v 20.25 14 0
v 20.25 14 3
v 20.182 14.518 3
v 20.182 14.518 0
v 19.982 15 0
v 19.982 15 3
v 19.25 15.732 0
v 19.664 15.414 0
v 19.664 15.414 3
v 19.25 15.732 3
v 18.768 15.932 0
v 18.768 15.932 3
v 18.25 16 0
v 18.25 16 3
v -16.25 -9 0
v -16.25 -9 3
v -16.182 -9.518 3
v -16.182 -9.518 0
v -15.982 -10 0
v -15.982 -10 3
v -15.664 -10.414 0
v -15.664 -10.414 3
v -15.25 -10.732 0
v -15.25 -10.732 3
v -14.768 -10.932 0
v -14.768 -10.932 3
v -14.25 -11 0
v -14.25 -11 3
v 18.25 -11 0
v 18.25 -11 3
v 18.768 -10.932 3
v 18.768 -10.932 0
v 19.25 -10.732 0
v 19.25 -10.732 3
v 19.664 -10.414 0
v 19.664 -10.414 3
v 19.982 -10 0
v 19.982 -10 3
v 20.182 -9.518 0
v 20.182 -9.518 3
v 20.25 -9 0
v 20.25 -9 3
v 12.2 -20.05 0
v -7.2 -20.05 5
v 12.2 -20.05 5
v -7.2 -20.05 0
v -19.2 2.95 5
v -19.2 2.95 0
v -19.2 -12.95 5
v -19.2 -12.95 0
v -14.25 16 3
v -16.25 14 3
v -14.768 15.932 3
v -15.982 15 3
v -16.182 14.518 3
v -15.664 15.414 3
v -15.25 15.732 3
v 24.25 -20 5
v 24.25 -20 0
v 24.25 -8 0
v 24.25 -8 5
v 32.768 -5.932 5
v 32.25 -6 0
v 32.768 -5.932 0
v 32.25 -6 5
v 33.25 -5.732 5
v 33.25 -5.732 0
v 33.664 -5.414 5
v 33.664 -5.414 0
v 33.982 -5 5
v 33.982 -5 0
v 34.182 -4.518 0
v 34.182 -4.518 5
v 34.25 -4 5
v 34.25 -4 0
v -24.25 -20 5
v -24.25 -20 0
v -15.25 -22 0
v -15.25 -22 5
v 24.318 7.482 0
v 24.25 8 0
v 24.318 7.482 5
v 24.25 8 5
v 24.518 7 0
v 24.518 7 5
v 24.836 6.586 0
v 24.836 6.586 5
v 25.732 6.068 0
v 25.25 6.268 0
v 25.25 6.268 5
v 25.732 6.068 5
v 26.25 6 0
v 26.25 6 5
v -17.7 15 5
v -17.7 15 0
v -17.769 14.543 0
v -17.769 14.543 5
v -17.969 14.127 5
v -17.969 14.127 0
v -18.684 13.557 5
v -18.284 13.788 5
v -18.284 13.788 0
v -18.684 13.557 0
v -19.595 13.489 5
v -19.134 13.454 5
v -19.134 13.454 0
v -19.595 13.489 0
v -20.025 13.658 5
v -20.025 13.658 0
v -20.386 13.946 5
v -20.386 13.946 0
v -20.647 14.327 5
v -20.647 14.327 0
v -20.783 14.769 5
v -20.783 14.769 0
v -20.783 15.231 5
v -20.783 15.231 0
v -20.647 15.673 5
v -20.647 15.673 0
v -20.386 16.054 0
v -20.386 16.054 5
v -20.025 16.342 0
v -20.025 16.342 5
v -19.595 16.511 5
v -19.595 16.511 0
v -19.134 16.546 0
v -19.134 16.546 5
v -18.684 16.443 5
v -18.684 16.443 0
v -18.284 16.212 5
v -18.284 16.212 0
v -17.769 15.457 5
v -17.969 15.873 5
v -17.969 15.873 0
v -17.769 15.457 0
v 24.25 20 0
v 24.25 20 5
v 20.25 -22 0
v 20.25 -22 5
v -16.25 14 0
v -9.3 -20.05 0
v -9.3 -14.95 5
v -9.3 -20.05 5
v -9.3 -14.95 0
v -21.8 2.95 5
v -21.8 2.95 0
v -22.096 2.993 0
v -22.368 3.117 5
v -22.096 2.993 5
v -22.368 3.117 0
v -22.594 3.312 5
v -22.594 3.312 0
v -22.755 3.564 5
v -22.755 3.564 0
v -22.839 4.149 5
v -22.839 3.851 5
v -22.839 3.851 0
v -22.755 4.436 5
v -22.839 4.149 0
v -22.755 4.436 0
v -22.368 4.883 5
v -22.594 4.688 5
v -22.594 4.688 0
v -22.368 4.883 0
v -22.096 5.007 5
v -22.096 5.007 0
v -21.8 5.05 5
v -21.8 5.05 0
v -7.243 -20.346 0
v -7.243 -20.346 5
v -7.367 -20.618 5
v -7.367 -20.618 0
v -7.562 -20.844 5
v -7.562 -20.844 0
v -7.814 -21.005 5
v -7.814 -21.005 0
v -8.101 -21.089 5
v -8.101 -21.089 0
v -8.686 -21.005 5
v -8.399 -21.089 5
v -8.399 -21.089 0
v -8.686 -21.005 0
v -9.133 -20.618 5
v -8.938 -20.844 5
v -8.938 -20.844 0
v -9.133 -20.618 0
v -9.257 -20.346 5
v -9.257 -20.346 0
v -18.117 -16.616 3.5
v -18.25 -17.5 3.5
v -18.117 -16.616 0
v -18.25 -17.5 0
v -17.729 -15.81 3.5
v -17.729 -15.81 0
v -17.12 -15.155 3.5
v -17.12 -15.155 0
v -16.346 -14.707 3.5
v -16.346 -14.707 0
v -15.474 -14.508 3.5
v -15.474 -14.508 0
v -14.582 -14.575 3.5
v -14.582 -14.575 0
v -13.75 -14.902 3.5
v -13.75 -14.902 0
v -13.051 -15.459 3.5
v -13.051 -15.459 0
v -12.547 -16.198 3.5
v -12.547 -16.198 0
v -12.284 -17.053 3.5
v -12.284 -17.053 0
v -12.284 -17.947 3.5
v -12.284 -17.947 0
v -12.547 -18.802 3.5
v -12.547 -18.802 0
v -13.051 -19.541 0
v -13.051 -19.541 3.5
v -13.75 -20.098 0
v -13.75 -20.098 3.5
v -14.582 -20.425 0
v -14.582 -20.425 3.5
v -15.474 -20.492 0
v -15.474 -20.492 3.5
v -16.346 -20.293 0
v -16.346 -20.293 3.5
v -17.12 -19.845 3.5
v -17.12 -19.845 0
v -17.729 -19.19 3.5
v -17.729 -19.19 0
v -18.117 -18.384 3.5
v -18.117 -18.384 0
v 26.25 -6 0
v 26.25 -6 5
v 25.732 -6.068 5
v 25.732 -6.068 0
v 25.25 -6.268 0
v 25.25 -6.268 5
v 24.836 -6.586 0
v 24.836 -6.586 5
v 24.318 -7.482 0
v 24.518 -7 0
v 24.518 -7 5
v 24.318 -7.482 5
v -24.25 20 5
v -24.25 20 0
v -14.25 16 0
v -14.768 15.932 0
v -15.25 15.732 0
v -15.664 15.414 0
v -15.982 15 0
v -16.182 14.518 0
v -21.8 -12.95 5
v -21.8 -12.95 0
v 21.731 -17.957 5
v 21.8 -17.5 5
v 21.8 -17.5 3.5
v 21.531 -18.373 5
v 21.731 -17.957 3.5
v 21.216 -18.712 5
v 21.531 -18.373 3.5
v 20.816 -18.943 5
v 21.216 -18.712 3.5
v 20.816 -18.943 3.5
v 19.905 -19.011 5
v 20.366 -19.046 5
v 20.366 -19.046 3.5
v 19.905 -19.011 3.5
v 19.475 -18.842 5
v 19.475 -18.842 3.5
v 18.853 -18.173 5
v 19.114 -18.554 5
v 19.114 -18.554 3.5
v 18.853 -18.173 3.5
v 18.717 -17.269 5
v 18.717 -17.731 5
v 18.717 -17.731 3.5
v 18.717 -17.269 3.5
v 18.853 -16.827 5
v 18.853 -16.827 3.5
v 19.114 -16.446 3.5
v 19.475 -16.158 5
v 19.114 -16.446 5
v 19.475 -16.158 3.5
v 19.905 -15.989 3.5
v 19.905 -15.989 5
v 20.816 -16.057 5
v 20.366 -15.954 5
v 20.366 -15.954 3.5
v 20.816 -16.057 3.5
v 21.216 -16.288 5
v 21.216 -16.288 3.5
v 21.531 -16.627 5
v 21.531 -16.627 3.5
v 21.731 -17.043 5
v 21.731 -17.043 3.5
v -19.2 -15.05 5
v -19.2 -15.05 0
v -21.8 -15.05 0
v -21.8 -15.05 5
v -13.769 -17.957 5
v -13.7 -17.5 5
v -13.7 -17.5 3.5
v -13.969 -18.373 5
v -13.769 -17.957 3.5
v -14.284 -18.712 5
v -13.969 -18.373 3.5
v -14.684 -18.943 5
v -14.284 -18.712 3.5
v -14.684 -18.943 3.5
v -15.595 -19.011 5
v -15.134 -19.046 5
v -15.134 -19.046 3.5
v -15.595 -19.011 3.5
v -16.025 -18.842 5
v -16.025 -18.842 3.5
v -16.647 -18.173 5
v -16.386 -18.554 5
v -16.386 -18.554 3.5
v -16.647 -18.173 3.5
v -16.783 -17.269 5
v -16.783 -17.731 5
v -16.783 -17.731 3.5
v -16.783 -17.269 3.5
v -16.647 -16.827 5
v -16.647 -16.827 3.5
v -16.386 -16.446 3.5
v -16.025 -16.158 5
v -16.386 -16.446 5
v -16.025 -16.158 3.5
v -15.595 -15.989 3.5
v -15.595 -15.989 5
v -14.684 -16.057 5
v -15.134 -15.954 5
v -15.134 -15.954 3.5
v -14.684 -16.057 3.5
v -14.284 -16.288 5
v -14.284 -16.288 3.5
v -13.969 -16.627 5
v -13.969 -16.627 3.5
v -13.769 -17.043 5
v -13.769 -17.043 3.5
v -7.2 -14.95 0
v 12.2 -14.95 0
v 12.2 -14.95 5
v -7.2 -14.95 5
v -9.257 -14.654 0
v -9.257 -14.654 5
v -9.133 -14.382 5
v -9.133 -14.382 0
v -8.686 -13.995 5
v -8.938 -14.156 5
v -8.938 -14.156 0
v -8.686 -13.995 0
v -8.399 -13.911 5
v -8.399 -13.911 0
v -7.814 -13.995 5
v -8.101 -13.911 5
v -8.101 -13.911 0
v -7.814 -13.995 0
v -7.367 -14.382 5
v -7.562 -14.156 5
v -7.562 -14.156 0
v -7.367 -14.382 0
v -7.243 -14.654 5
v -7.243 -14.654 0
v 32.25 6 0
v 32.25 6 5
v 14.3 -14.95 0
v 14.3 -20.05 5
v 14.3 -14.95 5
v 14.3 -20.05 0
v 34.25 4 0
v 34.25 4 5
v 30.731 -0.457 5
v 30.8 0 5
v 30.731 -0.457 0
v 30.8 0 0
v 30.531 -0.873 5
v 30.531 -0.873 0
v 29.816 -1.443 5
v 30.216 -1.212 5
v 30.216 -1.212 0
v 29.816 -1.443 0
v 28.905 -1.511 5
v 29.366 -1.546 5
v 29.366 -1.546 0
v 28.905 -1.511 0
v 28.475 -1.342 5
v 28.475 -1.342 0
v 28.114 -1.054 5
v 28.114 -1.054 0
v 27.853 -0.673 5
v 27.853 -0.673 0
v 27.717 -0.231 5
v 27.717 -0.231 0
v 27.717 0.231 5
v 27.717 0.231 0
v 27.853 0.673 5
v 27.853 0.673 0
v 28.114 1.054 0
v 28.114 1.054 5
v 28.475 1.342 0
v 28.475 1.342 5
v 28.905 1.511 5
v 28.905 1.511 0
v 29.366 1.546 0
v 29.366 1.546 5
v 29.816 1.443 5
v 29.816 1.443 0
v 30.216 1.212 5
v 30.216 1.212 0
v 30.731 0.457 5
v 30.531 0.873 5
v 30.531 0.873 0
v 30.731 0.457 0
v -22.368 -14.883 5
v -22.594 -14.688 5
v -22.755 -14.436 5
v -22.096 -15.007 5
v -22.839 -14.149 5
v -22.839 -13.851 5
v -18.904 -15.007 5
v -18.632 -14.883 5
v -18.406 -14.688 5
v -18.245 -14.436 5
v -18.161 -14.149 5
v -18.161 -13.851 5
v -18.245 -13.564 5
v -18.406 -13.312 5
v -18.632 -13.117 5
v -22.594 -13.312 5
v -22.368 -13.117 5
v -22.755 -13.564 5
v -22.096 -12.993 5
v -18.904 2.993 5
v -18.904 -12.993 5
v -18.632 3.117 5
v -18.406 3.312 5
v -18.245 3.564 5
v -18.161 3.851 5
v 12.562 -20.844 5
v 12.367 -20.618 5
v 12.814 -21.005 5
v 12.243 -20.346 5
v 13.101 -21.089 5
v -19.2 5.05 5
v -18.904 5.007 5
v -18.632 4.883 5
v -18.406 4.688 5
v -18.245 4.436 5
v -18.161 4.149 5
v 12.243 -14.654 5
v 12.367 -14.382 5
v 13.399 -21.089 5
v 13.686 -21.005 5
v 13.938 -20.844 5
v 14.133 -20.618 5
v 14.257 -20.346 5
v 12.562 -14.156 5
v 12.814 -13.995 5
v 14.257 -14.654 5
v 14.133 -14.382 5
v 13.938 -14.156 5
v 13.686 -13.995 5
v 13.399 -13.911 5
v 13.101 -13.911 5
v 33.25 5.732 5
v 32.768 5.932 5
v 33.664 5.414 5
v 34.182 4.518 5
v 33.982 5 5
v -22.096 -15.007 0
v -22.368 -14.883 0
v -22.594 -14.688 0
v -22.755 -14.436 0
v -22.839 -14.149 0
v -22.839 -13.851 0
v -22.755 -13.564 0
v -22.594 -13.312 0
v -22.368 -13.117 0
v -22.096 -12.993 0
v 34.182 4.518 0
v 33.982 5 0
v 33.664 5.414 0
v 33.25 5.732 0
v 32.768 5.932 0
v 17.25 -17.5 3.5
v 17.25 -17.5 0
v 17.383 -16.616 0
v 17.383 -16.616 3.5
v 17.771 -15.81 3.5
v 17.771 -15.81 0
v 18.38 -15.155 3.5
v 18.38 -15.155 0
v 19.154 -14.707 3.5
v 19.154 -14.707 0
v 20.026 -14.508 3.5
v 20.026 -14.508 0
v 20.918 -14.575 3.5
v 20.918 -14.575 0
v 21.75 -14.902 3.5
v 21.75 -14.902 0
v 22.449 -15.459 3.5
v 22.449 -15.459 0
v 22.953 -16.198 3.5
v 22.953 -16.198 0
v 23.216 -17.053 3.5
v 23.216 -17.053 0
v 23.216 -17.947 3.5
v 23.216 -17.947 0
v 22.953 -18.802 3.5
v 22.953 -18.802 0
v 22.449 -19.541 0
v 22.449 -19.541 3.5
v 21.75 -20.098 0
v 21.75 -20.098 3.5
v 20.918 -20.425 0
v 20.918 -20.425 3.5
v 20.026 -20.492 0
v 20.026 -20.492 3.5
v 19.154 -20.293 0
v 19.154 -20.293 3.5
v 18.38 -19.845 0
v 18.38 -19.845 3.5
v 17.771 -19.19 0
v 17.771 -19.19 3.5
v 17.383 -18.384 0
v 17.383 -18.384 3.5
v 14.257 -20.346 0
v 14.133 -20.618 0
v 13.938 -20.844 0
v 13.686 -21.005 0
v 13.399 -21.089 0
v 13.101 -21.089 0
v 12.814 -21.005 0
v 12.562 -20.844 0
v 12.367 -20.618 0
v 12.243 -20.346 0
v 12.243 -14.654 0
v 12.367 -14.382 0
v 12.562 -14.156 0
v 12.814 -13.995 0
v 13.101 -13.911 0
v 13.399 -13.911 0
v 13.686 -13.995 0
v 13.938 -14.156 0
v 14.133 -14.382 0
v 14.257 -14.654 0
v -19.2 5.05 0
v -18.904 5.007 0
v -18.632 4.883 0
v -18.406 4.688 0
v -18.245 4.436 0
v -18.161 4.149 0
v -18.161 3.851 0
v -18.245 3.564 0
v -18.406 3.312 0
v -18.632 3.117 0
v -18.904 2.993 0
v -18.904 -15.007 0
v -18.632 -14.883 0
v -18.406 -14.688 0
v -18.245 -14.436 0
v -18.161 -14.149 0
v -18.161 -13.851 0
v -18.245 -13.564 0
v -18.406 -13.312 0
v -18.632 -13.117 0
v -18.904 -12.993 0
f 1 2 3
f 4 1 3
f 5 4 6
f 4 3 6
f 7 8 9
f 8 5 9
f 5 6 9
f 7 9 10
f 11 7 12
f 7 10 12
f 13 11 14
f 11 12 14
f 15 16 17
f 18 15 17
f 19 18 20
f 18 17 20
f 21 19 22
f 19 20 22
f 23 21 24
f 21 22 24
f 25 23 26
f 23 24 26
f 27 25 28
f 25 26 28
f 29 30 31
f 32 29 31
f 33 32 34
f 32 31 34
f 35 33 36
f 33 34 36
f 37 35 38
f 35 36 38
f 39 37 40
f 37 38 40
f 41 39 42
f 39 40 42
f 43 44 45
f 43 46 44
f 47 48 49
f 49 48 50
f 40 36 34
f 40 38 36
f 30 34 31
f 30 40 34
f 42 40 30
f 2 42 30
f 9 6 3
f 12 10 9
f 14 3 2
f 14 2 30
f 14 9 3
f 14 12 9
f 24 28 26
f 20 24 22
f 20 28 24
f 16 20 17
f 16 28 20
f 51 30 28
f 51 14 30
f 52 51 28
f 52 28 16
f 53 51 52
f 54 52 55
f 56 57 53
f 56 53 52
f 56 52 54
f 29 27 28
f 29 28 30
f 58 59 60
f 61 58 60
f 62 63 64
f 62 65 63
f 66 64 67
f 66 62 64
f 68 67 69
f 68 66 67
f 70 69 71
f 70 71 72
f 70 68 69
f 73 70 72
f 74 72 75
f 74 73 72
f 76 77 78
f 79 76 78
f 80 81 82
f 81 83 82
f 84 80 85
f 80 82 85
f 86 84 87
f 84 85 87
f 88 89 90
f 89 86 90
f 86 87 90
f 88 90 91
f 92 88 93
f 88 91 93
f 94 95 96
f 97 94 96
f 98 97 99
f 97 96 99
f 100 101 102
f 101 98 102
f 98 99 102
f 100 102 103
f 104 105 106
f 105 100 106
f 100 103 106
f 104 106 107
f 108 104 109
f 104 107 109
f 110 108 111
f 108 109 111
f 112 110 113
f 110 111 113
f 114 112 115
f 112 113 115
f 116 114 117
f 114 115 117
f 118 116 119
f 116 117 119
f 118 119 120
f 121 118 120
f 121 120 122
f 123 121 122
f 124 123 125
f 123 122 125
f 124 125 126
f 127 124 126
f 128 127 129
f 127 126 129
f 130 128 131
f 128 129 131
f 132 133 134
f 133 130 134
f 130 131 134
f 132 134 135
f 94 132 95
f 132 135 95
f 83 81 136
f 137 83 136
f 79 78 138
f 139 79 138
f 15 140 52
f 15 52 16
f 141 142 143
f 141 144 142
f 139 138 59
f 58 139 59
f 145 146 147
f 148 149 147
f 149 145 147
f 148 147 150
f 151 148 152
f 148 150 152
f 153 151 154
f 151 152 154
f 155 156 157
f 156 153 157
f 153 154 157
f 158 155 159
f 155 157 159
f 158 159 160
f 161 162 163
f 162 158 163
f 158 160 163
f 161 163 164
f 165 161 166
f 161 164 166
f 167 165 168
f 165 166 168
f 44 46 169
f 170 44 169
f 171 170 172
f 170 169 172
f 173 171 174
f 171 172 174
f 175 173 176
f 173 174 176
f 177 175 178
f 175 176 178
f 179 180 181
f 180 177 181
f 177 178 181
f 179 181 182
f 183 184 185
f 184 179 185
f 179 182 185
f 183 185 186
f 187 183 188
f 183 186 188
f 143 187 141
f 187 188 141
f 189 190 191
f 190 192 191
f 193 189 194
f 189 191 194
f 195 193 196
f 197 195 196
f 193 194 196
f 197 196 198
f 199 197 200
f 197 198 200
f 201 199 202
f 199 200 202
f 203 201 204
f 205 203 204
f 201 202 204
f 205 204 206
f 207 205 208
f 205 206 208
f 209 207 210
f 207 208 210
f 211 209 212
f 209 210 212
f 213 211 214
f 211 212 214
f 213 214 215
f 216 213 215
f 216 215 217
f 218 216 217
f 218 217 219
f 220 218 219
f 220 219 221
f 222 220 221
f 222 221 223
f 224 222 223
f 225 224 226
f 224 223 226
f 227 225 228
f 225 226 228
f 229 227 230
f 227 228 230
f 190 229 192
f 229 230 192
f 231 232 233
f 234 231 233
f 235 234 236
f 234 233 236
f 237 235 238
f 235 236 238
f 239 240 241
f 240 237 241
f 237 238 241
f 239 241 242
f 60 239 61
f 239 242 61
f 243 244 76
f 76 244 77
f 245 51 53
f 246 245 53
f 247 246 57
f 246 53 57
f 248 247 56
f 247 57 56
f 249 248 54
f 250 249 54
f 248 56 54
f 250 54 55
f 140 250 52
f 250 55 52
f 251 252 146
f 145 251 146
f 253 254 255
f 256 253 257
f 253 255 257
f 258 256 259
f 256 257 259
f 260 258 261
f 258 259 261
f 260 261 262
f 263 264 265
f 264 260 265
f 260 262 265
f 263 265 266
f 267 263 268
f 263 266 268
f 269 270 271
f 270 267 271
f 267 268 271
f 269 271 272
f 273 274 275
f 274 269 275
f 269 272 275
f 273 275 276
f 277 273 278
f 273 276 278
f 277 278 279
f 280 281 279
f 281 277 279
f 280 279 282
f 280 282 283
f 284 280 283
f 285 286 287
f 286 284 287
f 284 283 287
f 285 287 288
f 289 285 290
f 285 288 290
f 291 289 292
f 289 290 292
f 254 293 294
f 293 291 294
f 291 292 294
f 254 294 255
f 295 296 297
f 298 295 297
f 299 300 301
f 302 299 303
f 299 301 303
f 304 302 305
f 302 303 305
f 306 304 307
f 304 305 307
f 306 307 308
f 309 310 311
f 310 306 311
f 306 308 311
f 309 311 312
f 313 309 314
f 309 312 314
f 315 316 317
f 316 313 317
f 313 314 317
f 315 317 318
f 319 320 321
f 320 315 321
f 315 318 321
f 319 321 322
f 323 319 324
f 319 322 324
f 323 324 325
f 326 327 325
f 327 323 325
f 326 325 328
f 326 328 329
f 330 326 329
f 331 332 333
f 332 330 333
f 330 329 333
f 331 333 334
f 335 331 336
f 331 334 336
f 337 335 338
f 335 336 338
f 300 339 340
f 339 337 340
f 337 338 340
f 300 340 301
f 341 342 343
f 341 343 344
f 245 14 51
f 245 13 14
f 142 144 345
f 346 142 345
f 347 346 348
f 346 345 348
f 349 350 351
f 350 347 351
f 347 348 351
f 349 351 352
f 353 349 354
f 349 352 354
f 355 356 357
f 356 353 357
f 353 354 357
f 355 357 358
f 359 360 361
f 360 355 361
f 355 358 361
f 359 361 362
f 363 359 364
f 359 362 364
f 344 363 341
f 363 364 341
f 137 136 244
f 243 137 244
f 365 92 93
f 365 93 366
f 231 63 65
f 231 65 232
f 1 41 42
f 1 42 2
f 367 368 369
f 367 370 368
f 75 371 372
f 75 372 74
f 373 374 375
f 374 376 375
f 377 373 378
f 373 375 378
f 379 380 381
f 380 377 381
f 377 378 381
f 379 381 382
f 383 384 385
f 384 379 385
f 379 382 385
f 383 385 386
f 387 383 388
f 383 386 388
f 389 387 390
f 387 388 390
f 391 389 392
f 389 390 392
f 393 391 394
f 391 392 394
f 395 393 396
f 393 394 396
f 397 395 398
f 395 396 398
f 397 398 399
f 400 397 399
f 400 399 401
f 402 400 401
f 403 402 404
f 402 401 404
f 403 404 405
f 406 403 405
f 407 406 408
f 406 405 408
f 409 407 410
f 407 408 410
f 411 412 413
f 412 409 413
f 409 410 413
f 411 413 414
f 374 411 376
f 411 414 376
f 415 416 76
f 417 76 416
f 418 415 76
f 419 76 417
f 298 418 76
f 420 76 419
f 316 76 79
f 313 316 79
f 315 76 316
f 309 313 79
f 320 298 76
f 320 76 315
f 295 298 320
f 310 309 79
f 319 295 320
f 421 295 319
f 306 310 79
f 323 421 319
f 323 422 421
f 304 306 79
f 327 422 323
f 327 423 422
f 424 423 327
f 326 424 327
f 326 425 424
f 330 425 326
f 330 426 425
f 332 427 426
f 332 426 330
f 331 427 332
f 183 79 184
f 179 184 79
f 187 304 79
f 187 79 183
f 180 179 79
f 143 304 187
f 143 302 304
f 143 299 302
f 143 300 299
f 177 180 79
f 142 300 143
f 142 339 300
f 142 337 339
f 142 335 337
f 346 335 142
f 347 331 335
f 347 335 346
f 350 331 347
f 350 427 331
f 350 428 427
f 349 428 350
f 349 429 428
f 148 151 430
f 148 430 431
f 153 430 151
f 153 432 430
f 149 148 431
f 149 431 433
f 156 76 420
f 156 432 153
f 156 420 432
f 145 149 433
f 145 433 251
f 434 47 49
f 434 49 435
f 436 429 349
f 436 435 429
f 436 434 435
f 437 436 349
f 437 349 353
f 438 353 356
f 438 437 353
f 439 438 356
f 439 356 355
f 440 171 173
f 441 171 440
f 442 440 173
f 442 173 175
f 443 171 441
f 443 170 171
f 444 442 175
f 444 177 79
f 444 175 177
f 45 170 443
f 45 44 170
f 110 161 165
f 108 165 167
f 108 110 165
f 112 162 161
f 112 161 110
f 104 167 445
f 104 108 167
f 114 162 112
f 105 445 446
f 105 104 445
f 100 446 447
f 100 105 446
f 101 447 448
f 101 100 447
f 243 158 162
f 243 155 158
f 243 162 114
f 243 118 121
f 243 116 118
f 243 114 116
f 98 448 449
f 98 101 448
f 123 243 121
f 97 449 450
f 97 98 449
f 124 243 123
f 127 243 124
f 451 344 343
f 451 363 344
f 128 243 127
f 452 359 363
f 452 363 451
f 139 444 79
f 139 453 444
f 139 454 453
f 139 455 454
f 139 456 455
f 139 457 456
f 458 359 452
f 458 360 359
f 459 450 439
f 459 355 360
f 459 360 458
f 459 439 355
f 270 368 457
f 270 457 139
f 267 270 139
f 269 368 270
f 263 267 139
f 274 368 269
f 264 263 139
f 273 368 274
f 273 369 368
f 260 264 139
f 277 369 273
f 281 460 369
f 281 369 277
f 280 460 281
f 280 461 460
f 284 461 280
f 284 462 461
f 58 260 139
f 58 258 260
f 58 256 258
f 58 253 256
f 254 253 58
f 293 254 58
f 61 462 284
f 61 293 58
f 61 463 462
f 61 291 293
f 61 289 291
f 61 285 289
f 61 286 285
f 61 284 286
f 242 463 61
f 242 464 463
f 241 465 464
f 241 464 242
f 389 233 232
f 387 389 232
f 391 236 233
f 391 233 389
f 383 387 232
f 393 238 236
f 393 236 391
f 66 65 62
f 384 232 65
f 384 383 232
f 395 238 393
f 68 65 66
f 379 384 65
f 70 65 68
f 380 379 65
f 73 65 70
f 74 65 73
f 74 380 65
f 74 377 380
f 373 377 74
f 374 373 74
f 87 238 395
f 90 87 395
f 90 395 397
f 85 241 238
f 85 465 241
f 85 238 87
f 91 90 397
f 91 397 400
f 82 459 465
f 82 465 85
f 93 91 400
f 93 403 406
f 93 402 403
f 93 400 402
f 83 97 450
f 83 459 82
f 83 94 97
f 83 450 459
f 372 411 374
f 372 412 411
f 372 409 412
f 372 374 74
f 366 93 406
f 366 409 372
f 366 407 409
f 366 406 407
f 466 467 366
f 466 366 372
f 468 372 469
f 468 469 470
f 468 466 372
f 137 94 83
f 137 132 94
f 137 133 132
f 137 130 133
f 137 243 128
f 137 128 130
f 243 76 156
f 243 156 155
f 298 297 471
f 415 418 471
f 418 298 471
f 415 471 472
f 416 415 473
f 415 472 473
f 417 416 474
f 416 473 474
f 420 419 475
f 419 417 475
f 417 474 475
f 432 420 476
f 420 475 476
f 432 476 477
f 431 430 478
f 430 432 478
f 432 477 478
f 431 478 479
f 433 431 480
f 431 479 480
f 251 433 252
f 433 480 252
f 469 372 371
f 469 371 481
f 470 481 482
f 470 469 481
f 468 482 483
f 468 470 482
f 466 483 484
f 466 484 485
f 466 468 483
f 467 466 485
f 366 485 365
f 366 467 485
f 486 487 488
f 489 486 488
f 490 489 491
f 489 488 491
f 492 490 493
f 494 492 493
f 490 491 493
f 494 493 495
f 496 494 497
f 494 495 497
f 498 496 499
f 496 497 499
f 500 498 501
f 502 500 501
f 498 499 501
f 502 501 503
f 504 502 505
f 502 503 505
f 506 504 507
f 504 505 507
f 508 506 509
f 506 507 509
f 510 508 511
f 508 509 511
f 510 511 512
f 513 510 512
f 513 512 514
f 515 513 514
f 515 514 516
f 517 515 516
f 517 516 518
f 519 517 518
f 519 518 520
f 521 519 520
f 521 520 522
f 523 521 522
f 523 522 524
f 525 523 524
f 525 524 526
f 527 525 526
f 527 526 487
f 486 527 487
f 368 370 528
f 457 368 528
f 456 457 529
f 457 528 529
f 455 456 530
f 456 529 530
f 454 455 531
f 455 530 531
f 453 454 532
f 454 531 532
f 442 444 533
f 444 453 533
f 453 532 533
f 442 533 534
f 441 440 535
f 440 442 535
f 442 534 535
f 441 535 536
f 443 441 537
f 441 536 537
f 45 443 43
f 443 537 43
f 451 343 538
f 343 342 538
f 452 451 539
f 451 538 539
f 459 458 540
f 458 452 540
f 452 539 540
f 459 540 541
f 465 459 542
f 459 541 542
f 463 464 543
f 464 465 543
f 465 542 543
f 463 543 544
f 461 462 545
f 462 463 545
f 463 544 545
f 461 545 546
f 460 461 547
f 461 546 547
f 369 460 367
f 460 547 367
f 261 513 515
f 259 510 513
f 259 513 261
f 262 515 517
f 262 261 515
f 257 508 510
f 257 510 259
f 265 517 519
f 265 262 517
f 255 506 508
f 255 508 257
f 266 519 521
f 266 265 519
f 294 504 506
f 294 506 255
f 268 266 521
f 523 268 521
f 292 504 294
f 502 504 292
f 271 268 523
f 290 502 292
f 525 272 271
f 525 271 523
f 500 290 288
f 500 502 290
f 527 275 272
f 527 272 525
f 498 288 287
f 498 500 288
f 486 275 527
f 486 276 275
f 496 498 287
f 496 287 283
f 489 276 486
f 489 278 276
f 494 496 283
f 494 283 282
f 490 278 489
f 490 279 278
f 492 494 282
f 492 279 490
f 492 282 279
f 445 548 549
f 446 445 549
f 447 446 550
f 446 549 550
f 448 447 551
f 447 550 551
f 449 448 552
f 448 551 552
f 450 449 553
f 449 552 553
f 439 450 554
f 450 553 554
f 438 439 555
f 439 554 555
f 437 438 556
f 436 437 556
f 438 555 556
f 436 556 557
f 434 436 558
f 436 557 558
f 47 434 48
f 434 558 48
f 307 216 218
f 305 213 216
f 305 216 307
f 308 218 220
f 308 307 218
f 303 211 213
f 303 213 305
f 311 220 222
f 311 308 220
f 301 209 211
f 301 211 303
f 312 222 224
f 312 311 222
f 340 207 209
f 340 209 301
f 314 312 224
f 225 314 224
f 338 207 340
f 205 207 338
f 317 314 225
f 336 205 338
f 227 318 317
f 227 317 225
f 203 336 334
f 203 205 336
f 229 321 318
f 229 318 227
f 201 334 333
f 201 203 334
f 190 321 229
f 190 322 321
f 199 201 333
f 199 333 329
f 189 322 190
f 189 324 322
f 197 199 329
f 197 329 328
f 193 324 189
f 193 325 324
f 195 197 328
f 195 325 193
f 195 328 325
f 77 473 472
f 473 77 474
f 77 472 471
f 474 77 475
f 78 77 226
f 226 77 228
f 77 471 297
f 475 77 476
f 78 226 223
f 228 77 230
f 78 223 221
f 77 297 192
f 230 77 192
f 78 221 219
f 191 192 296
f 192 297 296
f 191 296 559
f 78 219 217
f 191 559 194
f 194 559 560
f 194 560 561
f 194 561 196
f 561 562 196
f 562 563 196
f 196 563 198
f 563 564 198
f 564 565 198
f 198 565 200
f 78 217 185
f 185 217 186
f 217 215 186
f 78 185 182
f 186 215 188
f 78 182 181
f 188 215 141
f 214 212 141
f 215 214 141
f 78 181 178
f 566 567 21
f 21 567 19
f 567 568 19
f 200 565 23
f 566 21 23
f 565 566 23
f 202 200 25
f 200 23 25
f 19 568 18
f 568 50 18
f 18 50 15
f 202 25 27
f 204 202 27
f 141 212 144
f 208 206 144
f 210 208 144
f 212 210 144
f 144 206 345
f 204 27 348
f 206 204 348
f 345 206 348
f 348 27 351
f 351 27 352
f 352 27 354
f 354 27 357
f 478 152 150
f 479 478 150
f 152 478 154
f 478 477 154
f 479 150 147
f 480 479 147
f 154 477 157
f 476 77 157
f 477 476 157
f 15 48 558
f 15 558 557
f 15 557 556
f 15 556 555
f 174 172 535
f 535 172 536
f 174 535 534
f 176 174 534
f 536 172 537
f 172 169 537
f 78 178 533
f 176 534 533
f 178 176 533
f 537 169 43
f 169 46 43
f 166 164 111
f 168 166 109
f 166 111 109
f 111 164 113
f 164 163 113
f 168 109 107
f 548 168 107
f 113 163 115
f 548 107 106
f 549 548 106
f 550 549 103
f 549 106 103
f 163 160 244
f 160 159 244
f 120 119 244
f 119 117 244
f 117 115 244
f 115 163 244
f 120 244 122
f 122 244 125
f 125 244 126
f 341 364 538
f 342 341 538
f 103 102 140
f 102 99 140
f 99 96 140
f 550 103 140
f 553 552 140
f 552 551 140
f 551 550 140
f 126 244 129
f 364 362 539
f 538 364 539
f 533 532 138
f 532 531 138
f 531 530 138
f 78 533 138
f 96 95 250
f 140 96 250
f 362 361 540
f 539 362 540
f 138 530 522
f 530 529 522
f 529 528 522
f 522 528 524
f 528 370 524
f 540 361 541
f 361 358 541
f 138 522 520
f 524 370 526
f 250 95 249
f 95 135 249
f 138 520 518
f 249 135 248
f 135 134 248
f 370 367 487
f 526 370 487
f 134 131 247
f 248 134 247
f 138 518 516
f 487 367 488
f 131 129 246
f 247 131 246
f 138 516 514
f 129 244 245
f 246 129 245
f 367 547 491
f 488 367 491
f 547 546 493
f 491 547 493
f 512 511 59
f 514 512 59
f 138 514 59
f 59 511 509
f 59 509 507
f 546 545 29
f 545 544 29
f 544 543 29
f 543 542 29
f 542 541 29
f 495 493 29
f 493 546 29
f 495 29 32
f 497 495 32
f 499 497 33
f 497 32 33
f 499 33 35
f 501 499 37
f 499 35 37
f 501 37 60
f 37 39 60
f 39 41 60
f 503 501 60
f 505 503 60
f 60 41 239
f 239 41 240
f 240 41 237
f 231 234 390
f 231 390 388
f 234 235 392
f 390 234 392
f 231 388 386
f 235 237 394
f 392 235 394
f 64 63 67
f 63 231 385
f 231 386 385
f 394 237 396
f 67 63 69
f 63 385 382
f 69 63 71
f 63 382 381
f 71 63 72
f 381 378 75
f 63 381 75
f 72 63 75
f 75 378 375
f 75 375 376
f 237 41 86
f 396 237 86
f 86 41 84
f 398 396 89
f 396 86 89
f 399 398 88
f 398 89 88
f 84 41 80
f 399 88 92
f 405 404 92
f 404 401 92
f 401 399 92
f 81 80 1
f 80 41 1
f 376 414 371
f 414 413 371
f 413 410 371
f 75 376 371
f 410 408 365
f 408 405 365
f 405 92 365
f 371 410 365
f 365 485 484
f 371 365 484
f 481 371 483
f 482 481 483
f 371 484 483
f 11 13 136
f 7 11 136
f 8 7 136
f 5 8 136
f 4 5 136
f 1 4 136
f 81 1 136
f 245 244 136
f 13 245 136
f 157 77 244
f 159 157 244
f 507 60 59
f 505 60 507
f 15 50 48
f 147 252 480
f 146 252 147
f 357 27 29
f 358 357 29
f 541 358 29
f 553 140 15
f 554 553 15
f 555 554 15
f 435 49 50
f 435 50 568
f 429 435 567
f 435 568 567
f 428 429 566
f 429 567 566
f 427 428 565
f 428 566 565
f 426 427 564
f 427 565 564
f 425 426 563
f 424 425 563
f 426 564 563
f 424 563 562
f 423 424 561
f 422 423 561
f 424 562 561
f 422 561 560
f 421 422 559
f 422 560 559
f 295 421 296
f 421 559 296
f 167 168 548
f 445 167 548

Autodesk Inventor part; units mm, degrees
ref_plane "YZ Plane" through (0, 0, 0) normal (1, 0, 0) x (0, 1, 0)
ref_plane "XZ Plane" through (0, 0, 0) normal (0, 1, 0) x (-1, 0, 0)
ref_plane "XY Plane" through (0, 0, 0) normal (0, 0, 1) x (1, 0, 0)
sketch "スケッチ1" plane through (0, 0, 0) normal (0, 0, 1) x (1, 0, 0)
  line L0 (-24.25, -20) -> (24.25, -20) construction
  line L1 (24.25, -20) -> (24.25, 20)
  line L2 (24.25, 20) -> (-24.25, 20)
  line L3 (-24.25, 20) -> (-24.25, -20)
  line L4 (-24.25, -20) -> (24.25, 20) construction
  line L5 (24.25, -20) -> (-24.25, 20) construction
  circle A0 centre (-15.25, -17.5) radius 1.55
  circle A1 centre (20.25, -17.5) radius 1.55
  line L6 (-9.25, -15) -> (14.25, -15) construction
  line L7 (14.25, -15) -> (14.25, -20) construction
  line L8 (14.25, -20) -> (-9.25, -20) construction
  line L9 (-9.25, -20) -> (-9.25, -15) construction
  line L10 (-24.25, -20) -> (-15.25, -22)
  line L11 (-15.25, -22) -> (20.25, -22)
  line L12 (20.25, -22) -> (24.25, -20)
  line L13 (14.3, -14.95) -> (-9.3, -14.95)
  line L14 (-9.3, -14.95) -> (-9.3, -20.05)
  line L15 (-9.3, -20.05) -> (14.3, -20.05)
  line L16 (14.3, -20.05) -> (14.3, -14.95)
  circle A2 centre (-8.25, -14.95) radius 1.05
  circle A3 centre (-8.25, -20.05) radius 1.05
  circle A4 centre (13.25, -14.95) radius 1.05
  circle A5 centre (13.25, -20.05) radius 1.05
  circle A6 centre (-19.25, 15) radius 1.55
  line L17 (-21.8, 5.05) -> (-19.2, 5.05)
  line L18 (-19.2, 5.05) -> (-19.2, -15.05)
  line L19 (-19.2, -15.05) -> (-21.8, -15.05)
  line L20 (-21.8, -15.05) -> (-21.8, 5.05)
  line L21 (-19.25, 5) -> (-21.75, 5) construction
  line L22 (-21.75, 5) -> (-21.75, -15) construction
  line L23 (-21.75, -15) -> (-19.25, -15) construction
  line L24 (-19.25, -15) -> (-19.25, 5) construction
  line L25 (2.5, -14.95) -> (2.5, -20.05) construction
  circle A7 centre (-21.8, 4) radius 1.05
  circle A8 centre (-19.2, 4) radius 1.05
  circle A9 centre (-21.8, -14) radius 1.05
  circle A10 centre (-19.2, -14) radius 1.05
  line L26 (24.25, 6) -> (34.25, 6)
  line L27 (34.25, 6) -> (34.25, -6)
  line L28 (34.25, -6) -> (24.25, -6)
  line L29 (24.25, -6) -> (24.25, 6)
  circle A11 centre (29.25, 0) radius 1.55
  point P0 (0, 0)
  point P1 (-9.25, -17.5)
  dimension "d10" = 2.1
  dimension "d26" = 2.1
  dimension "d0" = 5
  dimension "d3" = 3.1
  dimension "d4" = 35.5
  dimension "d5" = 2
  dimension "d7" = 40
  dimension "d8" = 23.5
  dimension "d9" = 0.05
  dimension "d11" = 3.1
  dimension "d12" = 5
  dimension "d13" = 5
  dimension "d14" = 0.05
  dimension "d15" = 17.75
  dimension "d16" = 48.5
  dimension "d17" = 4
  dimension "d20" = 2.5
  dimension "d21" = 2.5
  dimension "d22" = 5
  dimension "d23" = 15
  dimension "d27" = 25
  dimension "d57" = 10
  dimension "d58" = 3.1
  dimension "d59" = 5
  dimension "d60" = 6
  dimension "d61" = 12
  dimension "d62" = 20
extrude "押し出し1" add sketch "スケッチ1" along normal blind 5
sketch "スケッチ2" plane through (0, 0, 0) normal (0, 0, -1) x (-1, 0, 0)
  line L0 (-14.3, -20.05) -> (-14.3, -14.95) projected
  line L1 (-12.2, -14.95) -> (7.2, -14.95) projected
  line L2 (24.25, 20) -> (-24.25, 20) projected
  line L3 (-24.25, 20) -> (-24.25, -20) projected
  line L4 (21.8, -15.05) -> (19.2, -15.05) projected
  line L5 (19.2, -12.95) -> (19.2, 2.95) projected
  line L6 (19.2, 5.05) -> (21.8, 5.05) projected
  line L7 (-20.25, 16) -> (16.25, 16)
  line L8 (16.25, 16) -> (16.25, -11)
  line L9 (16.25, -11) -> (-20.25, -11)
  line L10 (-20.25, -11) -> (-20.25, -5.9161)
  line L11 (-20.25, 16) -> (-20.25, 5.9161)
  line L12 (19.25, 5.05) -> (19.25, -15.05) construction
  line L13 (19.2, -15.05) -> (21.8, -15.05) projected
  line L14 (-14.3, -15) -> (9.3, -15) construction
  line L15 (9.3, -20.05) -> (9.3, -14.95) projected
  line L16 (-20.25, 5.9161) -> (-20.25, -5.9161)
  point P0 (0, 0)
  dimension "d29" = 4
  dimension "d30" = 4
  dimension "d31" = 0.05
  dimension "d32" = 3
  dimension "d33" = 0.05
  dimension "d34" = 4
sketch "スケッチ3" plane through (0, 0, 0) normal (0, 0, -1) x (-1, 0, 0)
  circle A0 centre (15.25, -17.5) radius 1.55 projected
  circle A1 centre (15.25, -17.5) radius 3
  circle A2 centre (19.25, 15) radius 1.55 projected
  circle A3 centre (19.25, 15) radius 3
  circle A4 centre (-20.25, -17.5) radius 3
  point P0 (0, 0)
  dimension "d38" = 6
  dimension "d39" = 6
  dimension "d40" = 6
extrude "押し出し3" cut sketch "スケッチ3" against normal blind 3.5 contours A1 | A4
extrude "押し出し5" cut sketch "スケッチ2" against normal blind 3
fillet "フィレット4" radius 2 4 edges at (20.25, -11, 1.5) (20.25, 16, 1.5) (-16.25, 16, 1.5) (-16.25, -11, 1.5)
fillet "フィレット5" radius 2 4 edges at (24.25, -6, 2.5) (34.25, -6, 2.5) (34.25, 6, 2.5) (24.25, 6, 2.5)
equation "\"d13\" = d12"
equation "\"d15\" = 0.5 * d4"
equation "\"d59\" = 0.5 * d57"
properties part number "コックピット_サブフレーム_1_5" material "アセタール樹脂、黒"
